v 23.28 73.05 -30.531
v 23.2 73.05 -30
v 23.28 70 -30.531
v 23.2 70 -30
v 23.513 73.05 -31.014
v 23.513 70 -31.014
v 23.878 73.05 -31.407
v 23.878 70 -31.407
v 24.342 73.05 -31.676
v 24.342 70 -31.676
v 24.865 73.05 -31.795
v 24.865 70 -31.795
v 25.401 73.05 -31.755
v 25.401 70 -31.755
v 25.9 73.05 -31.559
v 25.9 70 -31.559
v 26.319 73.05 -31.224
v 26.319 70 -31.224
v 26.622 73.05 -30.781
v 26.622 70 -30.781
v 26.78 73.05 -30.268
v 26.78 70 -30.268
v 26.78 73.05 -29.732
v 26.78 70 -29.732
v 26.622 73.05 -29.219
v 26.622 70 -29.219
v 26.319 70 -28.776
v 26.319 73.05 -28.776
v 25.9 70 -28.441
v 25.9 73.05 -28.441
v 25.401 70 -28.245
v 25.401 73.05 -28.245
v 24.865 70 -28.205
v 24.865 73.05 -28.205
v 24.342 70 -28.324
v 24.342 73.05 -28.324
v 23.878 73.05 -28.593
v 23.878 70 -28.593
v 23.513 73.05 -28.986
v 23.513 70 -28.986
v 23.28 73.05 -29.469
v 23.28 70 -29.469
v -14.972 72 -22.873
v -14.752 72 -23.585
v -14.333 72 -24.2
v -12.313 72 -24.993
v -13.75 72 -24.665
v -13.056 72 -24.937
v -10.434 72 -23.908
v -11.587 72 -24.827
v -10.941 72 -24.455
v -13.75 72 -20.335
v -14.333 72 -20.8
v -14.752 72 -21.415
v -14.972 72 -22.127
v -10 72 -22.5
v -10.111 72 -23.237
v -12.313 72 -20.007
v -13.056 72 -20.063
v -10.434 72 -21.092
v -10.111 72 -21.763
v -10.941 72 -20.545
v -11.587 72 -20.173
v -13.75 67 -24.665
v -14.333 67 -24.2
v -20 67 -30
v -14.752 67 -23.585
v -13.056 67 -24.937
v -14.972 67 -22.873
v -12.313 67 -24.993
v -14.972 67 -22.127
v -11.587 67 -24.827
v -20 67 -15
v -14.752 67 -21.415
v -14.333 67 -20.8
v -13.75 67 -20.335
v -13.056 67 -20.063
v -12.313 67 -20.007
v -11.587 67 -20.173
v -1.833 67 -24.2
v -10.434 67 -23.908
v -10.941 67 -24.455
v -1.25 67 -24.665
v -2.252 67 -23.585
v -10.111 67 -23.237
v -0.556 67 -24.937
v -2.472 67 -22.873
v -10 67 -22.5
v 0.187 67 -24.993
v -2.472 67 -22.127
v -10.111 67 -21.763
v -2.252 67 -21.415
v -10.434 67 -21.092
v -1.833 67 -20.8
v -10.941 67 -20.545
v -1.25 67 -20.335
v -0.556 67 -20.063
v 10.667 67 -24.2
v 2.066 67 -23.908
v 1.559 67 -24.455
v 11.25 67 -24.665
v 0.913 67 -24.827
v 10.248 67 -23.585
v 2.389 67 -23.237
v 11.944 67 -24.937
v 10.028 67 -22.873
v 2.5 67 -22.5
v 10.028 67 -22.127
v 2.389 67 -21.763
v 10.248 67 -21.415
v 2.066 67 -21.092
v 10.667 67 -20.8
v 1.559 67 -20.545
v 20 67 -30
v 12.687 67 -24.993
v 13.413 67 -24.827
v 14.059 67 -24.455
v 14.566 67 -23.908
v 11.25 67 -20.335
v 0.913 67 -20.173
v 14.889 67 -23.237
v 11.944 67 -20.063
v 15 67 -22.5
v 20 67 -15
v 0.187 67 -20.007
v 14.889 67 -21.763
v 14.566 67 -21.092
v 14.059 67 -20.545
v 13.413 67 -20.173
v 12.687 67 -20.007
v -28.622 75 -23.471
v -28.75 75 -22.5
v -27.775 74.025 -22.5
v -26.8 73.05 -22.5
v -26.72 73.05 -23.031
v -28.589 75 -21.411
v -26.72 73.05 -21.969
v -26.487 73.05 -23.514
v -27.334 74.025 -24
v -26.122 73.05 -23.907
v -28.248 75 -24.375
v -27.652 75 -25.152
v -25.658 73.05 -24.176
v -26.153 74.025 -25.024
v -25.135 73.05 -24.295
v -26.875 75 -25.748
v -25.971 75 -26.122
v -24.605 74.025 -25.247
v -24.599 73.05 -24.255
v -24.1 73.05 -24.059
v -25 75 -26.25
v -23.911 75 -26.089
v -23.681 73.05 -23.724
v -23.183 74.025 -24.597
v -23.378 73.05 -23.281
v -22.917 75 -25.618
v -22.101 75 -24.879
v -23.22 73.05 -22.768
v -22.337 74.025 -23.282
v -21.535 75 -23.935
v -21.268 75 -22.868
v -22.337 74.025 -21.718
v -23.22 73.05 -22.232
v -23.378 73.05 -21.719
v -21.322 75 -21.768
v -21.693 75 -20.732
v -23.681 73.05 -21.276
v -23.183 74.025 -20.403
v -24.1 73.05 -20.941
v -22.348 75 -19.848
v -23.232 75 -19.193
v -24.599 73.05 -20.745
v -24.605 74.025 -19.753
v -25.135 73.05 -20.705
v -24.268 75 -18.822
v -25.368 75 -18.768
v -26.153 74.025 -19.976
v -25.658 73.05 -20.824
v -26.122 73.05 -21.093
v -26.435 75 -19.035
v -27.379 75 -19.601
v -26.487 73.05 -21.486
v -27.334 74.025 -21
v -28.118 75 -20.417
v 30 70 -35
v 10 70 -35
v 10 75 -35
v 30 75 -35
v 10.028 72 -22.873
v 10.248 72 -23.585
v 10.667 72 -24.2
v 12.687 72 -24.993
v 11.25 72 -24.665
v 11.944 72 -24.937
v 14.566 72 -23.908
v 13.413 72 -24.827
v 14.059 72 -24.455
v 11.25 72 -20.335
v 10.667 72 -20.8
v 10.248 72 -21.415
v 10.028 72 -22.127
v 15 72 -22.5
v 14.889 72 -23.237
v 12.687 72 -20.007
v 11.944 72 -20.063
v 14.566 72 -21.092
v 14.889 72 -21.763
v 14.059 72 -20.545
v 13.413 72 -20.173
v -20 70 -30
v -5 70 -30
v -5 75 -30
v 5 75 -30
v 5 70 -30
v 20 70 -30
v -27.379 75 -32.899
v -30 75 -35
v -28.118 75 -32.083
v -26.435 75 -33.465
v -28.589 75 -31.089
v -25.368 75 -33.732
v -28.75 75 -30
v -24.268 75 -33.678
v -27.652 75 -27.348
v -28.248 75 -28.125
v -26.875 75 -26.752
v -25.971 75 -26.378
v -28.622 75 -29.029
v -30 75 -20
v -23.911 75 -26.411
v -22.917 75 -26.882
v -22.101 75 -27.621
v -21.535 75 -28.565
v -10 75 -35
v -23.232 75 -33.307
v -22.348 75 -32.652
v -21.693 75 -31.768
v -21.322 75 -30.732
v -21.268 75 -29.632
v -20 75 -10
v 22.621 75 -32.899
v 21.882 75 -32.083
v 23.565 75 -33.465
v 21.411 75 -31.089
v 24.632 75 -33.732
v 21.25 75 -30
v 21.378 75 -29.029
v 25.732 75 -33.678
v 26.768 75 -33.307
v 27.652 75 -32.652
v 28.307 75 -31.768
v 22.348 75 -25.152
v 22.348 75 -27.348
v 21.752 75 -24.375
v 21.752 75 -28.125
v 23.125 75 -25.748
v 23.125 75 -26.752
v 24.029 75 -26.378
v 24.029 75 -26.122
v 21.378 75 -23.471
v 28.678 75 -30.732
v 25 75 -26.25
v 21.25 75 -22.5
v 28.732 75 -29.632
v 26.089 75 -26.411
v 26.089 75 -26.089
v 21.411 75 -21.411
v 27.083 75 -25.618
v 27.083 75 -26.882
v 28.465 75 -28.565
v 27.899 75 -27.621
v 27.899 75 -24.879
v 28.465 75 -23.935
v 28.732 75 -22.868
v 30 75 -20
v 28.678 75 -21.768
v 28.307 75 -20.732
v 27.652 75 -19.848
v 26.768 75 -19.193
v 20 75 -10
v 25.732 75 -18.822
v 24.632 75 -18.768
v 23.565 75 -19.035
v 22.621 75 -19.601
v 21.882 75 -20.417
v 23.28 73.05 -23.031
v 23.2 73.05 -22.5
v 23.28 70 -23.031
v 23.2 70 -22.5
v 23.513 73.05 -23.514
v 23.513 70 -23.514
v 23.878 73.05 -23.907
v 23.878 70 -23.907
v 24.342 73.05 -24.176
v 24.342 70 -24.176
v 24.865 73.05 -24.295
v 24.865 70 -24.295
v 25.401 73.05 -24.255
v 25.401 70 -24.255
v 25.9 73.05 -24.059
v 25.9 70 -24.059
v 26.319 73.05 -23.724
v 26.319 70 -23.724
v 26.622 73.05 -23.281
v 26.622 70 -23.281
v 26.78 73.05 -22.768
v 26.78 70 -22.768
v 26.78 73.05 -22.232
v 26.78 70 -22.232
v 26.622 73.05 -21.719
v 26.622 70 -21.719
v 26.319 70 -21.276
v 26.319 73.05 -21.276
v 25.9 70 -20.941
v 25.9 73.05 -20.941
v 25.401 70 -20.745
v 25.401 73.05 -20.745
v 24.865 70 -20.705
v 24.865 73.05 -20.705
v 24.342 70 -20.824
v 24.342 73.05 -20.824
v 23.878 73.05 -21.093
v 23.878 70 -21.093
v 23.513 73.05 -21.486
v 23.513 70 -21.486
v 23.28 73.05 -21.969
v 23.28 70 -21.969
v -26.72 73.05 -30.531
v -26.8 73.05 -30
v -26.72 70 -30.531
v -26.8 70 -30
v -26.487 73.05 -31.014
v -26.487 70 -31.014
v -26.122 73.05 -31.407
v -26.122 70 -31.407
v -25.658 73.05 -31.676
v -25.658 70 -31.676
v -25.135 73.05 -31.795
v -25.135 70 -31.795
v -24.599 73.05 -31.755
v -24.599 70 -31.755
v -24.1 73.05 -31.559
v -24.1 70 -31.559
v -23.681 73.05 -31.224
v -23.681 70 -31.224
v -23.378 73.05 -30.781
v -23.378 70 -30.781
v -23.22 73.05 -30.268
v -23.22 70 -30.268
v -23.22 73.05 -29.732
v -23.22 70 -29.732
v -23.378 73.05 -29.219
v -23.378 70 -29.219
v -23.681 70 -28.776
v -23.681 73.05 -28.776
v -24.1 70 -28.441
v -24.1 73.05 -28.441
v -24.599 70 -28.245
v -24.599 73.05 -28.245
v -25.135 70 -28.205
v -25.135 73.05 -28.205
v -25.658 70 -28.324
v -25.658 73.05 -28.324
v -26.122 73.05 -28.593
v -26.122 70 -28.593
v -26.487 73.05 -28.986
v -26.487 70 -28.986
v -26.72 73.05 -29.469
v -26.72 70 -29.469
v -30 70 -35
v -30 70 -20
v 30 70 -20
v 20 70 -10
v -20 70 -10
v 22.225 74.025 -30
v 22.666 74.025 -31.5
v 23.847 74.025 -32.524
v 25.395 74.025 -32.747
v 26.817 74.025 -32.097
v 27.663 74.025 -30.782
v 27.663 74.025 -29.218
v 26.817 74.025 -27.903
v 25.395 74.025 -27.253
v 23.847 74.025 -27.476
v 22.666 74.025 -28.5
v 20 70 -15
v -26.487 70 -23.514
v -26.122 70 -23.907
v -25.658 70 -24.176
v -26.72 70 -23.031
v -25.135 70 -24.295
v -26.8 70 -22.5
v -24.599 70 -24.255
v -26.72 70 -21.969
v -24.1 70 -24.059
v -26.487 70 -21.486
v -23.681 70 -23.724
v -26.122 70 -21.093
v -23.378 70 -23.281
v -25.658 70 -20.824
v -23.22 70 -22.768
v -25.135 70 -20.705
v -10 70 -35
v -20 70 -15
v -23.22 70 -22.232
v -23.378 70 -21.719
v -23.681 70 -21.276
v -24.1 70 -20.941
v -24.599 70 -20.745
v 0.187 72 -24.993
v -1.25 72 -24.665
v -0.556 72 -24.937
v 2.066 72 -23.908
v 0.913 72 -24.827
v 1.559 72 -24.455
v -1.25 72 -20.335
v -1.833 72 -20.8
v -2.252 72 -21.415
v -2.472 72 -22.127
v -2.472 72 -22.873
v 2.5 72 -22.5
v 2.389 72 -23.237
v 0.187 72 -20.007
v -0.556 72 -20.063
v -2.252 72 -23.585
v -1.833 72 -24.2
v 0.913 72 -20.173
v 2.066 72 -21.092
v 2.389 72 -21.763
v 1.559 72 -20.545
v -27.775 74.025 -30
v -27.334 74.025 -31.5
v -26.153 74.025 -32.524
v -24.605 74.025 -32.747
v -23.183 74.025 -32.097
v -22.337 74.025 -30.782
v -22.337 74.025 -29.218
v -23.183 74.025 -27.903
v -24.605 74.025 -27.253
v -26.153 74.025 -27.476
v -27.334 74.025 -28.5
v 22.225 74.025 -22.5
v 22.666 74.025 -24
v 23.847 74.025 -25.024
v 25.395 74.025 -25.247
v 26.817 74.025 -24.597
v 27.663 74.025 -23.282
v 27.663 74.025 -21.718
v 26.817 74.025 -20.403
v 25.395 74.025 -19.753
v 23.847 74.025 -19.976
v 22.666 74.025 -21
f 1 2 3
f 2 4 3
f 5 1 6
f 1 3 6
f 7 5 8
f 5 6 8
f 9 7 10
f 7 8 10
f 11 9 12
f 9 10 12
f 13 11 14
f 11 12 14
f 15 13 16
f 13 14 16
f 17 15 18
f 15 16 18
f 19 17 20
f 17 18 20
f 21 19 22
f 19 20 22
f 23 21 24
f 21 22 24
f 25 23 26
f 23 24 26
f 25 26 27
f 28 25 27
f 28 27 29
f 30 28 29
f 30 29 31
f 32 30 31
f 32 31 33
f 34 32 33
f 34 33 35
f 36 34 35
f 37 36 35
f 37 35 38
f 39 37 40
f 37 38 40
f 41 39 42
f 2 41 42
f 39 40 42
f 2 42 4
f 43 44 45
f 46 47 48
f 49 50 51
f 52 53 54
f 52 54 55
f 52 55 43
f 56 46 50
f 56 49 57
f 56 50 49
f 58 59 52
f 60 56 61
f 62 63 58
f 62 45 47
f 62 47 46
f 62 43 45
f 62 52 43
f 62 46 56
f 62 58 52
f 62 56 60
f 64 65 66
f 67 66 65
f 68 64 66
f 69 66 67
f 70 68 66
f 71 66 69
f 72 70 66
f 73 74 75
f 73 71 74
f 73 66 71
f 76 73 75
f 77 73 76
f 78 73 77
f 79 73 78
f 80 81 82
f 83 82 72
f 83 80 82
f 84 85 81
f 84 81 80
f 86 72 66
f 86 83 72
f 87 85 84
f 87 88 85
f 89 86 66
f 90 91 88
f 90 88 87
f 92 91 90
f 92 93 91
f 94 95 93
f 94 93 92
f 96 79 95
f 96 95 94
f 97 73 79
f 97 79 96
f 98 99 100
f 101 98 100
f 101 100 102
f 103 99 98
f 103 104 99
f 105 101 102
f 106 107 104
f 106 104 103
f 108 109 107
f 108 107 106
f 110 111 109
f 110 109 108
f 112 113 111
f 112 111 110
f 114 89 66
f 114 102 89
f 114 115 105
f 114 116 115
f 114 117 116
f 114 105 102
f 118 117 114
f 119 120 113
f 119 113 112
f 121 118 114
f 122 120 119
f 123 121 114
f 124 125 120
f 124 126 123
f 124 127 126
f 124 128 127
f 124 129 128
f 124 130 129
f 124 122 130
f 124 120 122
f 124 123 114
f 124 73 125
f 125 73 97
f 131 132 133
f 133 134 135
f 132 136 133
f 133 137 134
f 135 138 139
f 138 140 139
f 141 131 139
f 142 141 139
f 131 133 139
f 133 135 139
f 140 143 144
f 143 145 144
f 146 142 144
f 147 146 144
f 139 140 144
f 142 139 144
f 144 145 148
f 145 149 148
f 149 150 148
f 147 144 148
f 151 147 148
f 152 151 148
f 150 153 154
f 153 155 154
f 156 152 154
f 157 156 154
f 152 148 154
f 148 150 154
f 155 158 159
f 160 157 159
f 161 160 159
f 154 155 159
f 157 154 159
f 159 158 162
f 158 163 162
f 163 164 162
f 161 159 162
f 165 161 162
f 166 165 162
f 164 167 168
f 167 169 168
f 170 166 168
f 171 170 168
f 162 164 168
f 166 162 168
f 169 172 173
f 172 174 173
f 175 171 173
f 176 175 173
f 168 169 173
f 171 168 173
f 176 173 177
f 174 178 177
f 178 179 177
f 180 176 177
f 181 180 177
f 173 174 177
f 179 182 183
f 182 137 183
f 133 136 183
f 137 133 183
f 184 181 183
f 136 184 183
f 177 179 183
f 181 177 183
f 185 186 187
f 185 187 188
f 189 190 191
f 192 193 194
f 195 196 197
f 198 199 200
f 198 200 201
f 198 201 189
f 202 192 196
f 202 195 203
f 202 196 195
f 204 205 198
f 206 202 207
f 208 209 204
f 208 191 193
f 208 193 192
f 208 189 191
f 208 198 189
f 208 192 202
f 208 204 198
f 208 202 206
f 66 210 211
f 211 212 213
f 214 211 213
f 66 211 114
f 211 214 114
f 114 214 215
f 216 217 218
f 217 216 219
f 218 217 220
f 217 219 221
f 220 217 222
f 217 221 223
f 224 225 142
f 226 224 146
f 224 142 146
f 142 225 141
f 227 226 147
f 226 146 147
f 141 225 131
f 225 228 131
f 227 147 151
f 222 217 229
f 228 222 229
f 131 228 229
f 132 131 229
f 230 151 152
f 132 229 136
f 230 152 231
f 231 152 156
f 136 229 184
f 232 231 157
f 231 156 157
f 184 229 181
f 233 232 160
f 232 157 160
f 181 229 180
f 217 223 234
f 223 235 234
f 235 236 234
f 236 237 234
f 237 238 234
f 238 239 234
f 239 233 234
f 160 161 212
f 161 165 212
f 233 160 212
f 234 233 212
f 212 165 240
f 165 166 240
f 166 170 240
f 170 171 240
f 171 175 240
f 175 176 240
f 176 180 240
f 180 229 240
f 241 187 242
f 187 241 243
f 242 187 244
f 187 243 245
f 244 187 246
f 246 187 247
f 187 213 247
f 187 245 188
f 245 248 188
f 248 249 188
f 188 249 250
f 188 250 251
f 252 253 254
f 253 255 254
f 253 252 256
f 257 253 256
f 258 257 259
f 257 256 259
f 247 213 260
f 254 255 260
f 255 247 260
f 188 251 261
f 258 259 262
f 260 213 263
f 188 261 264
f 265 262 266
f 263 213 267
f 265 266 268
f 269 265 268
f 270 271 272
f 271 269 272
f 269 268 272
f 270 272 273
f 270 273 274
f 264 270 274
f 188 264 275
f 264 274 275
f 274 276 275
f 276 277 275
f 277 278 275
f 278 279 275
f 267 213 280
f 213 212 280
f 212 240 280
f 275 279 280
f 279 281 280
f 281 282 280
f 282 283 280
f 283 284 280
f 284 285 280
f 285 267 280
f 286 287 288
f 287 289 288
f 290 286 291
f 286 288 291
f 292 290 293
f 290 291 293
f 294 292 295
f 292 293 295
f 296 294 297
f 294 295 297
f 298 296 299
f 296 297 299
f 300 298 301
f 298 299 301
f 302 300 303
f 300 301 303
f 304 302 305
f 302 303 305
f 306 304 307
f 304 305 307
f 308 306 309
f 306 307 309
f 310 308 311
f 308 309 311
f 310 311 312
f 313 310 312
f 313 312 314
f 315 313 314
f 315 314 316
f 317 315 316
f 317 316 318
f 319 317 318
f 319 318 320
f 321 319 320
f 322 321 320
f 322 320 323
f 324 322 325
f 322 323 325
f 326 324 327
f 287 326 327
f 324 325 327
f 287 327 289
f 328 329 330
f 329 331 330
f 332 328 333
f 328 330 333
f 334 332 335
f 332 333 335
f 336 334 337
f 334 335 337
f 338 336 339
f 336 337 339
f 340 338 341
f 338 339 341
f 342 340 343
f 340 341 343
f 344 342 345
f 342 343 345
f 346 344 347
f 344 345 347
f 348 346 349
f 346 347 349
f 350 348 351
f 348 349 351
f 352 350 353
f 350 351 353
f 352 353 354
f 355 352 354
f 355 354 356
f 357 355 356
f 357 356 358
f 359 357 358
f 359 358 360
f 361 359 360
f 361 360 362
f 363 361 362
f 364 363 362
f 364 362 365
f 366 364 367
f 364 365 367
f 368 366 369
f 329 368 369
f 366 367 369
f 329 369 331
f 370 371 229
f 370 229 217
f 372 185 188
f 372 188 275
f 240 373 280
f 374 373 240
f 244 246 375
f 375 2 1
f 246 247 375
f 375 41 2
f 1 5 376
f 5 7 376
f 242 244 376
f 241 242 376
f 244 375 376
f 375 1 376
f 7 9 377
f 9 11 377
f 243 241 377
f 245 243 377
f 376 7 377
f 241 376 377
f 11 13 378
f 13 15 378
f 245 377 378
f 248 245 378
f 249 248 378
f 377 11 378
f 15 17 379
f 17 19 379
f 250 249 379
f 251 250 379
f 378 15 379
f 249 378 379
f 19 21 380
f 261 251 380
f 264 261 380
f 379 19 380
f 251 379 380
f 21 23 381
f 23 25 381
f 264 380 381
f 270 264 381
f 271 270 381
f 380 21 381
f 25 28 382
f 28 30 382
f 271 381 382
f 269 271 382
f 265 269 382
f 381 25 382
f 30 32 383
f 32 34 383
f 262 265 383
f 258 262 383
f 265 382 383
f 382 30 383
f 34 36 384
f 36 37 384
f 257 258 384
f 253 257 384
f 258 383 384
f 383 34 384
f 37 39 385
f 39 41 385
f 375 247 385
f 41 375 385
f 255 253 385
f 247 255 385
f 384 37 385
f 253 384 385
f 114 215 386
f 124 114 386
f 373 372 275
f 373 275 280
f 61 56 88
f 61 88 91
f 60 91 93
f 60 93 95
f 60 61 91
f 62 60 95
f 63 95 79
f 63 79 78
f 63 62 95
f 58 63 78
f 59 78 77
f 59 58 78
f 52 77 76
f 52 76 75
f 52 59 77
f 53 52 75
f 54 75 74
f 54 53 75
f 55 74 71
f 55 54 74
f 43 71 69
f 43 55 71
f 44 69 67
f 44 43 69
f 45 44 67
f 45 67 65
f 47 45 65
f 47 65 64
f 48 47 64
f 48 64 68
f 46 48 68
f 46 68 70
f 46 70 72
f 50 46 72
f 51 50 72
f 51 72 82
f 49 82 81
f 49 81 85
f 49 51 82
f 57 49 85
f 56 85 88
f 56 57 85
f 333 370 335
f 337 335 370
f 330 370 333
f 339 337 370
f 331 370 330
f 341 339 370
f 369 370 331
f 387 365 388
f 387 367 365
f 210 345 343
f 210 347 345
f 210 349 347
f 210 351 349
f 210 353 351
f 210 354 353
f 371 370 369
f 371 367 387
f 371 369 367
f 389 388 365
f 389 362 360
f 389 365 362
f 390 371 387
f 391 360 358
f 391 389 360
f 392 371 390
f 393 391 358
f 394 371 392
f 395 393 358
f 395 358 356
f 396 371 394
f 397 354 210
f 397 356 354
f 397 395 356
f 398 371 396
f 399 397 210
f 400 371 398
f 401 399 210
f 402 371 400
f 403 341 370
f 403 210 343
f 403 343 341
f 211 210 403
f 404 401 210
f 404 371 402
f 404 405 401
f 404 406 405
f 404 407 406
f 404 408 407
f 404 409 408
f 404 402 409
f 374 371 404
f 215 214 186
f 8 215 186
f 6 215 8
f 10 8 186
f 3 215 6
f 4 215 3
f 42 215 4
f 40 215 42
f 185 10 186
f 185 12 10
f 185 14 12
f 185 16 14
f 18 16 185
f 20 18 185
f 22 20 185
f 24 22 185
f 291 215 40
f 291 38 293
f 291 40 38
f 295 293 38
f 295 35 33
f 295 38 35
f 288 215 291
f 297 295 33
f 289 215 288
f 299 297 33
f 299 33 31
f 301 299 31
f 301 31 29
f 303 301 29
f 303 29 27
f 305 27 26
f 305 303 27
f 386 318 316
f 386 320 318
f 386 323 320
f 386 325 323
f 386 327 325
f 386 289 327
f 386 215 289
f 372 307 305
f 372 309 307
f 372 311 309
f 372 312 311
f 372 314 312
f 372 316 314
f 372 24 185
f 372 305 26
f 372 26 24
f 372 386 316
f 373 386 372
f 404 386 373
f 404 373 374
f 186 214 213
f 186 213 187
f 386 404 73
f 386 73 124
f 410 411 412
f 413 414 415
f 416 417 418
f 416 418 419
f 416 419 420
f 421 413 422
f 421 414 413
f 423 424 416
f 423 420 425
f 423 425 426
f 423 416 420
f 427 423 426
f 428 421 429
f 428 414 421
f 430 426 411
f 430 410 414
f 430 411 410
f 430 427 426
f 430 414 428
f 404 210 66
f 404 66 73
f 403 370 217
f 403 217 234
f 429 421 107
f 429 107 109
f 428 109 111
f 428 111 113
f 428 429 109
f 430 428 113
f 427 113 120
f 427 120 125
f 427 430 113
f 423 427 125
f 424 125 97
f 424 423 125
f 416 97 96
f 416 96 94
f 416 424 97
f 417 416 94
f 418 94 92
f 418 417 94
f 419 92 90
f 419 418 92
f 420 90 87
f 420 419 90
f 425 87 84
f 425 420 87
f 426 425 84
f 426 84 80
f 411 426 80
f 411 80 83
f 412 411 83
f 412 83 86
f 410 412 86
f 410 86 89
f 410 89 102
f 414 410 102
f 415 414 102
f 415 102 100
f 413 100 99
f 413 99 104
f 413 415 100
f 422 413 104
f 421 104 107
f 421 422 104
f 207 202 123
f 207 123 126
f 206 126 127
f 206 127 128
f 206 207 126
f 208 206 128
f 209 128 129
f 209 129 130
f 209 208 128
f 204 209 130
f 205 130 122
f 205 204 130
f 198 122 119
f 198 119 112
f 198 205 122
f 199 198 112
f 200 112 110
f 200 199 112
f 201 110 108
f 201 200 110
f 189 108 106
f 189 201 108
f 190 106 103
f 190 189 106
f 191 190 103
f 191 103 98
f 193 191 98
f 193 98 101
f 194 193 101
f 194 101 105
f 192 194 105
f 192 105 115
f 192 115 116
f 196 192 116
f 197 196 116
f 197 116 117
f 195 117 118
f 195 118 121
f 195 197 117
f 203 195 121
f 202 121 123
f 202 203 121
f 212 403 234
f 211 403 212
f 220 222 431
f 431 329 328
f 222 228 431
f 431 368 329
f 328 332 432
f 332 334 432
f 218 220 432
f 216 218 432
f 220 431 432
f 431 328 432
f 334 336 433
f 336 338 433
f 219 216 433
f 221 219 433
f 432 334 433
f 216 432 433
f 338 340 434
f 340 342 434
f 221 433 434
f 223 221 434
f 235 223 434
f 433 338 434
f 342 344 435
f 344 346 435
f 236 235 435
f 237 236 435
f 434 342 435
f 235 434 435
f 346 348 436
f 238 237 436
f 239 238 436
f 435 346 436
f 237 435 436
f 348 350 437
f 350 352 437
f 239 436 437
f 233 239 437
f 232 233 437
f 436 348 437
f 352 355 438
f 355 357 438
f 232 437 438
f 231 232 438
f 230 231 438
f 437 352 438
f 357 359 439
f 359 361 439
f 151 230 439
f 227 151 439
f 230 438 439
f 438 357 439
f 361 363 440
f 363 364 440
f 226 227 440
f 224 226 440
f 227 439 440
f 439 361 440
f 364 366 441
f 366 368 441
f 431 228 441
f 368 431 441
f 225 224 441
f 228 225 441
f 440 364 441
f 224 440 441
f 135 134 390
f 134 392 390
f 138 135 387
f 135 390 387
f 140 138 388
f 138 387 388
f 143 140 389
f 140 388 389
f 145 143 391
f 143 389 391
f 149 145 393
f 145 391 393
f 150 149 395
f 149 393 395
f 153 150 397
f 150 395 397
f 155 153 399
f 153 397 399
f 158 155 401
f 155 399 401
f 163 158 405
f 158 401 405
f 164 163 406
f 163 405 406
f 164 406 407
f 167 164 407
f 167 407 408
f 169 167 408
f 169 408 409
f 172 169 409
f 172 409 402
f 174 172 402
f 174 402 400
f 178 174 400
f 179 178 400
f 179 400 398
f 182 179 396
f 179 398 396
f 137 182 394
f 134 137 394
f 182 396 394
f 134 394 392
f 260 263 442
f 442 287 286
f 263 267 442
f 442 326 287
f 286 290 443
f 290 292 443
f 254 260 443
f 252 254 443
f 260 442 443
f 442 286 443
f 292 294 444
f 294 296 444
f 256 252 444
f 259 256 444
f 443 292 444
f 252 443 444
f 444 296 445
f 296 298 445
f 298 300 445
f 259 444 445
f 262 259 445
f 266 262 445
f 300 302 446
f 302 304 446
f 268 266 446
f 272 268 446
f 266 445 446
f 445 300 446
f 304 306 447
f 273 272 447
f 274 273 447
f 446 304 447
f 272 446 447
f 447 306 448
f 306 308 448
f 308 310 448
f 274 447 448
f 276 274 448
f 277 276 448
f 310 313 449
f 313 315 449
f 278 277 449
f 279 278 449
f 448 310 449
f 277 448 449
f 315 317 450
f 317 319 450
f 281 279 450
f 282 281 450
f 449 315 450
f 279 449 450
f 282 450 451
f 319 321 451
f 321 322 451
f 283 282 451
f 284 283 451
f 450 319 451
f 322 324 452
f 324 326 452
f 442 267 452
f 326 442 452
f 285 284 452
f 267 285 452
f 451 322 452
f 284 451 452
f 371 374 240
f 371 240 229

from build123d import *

# Parameters (mm, degrees)
PAD017_DEPTH        = 5
HOLE001_D           = 3.6
HOLE001_DEPTH       = 25
HOLE001_CSINK_D     = 7.5
HOLE001_CSINK_ANGLE = 90
SKETCH026_W         = 40
SKETCH026_H         = 15
PAD018_DEPTH        = 3
SKETCH027_R         = 2.5
POCKET006_DEPTH     = 5


with BuildPart() as part:
    # Sketch024 → Pad017 (new body)
    with BuildSketch(Plane.XZ.offset(-70)):
        Polygon((-30, -20), (-30, -35), (-10, -35), (-5, -30), (5, -30), (10, -35), (30, -35), (30, -20), (20, -10), (-20, -10), align=None)
    extrude(amount=-PAD017_DEPTH)

    # Hole001
    with Locations(Plane(origin=(0, 75, 0), x_dir=(1, 0, 0), z_dir=(0, 1, 0))):
        with Locations((25, 22.5), (25, 30), (-25, 30), (-25, 22.5)):
            CounterSinkHole(HOLE001_D / 2, HOLE001_CSINK_D / 2, depth=HOLE001_DEPTH, counter_sink_angle=HOLE001_CSINK_ANGLE)

    # Sketch026 → Pad018 (join)
    with BuildSketch(Plane.XZ.offset(-70)):
        with Locations((0, -22.5)):
            Rectangle(SKETCH026_W, SKETCH026_H)
    extrude(amount=PAD018_DEPTH)

    # Sketch027 → Pocket006 (cut)
    with BuildSketch(Plane.XZ.offset(-72)):
        with Locations((-12.5, -22.5)):
            Circle(SKETCH027_R)
        with Locations((0, -22.5)):
            Circle(SKETCH027_R)
        with Locations((12.5, -22.5)):
            Circle(SKETCH027_R)
    extrude(amount=POCKET006_DEPTH, mode=Mode.SUBTRACT)


solid = part.part
